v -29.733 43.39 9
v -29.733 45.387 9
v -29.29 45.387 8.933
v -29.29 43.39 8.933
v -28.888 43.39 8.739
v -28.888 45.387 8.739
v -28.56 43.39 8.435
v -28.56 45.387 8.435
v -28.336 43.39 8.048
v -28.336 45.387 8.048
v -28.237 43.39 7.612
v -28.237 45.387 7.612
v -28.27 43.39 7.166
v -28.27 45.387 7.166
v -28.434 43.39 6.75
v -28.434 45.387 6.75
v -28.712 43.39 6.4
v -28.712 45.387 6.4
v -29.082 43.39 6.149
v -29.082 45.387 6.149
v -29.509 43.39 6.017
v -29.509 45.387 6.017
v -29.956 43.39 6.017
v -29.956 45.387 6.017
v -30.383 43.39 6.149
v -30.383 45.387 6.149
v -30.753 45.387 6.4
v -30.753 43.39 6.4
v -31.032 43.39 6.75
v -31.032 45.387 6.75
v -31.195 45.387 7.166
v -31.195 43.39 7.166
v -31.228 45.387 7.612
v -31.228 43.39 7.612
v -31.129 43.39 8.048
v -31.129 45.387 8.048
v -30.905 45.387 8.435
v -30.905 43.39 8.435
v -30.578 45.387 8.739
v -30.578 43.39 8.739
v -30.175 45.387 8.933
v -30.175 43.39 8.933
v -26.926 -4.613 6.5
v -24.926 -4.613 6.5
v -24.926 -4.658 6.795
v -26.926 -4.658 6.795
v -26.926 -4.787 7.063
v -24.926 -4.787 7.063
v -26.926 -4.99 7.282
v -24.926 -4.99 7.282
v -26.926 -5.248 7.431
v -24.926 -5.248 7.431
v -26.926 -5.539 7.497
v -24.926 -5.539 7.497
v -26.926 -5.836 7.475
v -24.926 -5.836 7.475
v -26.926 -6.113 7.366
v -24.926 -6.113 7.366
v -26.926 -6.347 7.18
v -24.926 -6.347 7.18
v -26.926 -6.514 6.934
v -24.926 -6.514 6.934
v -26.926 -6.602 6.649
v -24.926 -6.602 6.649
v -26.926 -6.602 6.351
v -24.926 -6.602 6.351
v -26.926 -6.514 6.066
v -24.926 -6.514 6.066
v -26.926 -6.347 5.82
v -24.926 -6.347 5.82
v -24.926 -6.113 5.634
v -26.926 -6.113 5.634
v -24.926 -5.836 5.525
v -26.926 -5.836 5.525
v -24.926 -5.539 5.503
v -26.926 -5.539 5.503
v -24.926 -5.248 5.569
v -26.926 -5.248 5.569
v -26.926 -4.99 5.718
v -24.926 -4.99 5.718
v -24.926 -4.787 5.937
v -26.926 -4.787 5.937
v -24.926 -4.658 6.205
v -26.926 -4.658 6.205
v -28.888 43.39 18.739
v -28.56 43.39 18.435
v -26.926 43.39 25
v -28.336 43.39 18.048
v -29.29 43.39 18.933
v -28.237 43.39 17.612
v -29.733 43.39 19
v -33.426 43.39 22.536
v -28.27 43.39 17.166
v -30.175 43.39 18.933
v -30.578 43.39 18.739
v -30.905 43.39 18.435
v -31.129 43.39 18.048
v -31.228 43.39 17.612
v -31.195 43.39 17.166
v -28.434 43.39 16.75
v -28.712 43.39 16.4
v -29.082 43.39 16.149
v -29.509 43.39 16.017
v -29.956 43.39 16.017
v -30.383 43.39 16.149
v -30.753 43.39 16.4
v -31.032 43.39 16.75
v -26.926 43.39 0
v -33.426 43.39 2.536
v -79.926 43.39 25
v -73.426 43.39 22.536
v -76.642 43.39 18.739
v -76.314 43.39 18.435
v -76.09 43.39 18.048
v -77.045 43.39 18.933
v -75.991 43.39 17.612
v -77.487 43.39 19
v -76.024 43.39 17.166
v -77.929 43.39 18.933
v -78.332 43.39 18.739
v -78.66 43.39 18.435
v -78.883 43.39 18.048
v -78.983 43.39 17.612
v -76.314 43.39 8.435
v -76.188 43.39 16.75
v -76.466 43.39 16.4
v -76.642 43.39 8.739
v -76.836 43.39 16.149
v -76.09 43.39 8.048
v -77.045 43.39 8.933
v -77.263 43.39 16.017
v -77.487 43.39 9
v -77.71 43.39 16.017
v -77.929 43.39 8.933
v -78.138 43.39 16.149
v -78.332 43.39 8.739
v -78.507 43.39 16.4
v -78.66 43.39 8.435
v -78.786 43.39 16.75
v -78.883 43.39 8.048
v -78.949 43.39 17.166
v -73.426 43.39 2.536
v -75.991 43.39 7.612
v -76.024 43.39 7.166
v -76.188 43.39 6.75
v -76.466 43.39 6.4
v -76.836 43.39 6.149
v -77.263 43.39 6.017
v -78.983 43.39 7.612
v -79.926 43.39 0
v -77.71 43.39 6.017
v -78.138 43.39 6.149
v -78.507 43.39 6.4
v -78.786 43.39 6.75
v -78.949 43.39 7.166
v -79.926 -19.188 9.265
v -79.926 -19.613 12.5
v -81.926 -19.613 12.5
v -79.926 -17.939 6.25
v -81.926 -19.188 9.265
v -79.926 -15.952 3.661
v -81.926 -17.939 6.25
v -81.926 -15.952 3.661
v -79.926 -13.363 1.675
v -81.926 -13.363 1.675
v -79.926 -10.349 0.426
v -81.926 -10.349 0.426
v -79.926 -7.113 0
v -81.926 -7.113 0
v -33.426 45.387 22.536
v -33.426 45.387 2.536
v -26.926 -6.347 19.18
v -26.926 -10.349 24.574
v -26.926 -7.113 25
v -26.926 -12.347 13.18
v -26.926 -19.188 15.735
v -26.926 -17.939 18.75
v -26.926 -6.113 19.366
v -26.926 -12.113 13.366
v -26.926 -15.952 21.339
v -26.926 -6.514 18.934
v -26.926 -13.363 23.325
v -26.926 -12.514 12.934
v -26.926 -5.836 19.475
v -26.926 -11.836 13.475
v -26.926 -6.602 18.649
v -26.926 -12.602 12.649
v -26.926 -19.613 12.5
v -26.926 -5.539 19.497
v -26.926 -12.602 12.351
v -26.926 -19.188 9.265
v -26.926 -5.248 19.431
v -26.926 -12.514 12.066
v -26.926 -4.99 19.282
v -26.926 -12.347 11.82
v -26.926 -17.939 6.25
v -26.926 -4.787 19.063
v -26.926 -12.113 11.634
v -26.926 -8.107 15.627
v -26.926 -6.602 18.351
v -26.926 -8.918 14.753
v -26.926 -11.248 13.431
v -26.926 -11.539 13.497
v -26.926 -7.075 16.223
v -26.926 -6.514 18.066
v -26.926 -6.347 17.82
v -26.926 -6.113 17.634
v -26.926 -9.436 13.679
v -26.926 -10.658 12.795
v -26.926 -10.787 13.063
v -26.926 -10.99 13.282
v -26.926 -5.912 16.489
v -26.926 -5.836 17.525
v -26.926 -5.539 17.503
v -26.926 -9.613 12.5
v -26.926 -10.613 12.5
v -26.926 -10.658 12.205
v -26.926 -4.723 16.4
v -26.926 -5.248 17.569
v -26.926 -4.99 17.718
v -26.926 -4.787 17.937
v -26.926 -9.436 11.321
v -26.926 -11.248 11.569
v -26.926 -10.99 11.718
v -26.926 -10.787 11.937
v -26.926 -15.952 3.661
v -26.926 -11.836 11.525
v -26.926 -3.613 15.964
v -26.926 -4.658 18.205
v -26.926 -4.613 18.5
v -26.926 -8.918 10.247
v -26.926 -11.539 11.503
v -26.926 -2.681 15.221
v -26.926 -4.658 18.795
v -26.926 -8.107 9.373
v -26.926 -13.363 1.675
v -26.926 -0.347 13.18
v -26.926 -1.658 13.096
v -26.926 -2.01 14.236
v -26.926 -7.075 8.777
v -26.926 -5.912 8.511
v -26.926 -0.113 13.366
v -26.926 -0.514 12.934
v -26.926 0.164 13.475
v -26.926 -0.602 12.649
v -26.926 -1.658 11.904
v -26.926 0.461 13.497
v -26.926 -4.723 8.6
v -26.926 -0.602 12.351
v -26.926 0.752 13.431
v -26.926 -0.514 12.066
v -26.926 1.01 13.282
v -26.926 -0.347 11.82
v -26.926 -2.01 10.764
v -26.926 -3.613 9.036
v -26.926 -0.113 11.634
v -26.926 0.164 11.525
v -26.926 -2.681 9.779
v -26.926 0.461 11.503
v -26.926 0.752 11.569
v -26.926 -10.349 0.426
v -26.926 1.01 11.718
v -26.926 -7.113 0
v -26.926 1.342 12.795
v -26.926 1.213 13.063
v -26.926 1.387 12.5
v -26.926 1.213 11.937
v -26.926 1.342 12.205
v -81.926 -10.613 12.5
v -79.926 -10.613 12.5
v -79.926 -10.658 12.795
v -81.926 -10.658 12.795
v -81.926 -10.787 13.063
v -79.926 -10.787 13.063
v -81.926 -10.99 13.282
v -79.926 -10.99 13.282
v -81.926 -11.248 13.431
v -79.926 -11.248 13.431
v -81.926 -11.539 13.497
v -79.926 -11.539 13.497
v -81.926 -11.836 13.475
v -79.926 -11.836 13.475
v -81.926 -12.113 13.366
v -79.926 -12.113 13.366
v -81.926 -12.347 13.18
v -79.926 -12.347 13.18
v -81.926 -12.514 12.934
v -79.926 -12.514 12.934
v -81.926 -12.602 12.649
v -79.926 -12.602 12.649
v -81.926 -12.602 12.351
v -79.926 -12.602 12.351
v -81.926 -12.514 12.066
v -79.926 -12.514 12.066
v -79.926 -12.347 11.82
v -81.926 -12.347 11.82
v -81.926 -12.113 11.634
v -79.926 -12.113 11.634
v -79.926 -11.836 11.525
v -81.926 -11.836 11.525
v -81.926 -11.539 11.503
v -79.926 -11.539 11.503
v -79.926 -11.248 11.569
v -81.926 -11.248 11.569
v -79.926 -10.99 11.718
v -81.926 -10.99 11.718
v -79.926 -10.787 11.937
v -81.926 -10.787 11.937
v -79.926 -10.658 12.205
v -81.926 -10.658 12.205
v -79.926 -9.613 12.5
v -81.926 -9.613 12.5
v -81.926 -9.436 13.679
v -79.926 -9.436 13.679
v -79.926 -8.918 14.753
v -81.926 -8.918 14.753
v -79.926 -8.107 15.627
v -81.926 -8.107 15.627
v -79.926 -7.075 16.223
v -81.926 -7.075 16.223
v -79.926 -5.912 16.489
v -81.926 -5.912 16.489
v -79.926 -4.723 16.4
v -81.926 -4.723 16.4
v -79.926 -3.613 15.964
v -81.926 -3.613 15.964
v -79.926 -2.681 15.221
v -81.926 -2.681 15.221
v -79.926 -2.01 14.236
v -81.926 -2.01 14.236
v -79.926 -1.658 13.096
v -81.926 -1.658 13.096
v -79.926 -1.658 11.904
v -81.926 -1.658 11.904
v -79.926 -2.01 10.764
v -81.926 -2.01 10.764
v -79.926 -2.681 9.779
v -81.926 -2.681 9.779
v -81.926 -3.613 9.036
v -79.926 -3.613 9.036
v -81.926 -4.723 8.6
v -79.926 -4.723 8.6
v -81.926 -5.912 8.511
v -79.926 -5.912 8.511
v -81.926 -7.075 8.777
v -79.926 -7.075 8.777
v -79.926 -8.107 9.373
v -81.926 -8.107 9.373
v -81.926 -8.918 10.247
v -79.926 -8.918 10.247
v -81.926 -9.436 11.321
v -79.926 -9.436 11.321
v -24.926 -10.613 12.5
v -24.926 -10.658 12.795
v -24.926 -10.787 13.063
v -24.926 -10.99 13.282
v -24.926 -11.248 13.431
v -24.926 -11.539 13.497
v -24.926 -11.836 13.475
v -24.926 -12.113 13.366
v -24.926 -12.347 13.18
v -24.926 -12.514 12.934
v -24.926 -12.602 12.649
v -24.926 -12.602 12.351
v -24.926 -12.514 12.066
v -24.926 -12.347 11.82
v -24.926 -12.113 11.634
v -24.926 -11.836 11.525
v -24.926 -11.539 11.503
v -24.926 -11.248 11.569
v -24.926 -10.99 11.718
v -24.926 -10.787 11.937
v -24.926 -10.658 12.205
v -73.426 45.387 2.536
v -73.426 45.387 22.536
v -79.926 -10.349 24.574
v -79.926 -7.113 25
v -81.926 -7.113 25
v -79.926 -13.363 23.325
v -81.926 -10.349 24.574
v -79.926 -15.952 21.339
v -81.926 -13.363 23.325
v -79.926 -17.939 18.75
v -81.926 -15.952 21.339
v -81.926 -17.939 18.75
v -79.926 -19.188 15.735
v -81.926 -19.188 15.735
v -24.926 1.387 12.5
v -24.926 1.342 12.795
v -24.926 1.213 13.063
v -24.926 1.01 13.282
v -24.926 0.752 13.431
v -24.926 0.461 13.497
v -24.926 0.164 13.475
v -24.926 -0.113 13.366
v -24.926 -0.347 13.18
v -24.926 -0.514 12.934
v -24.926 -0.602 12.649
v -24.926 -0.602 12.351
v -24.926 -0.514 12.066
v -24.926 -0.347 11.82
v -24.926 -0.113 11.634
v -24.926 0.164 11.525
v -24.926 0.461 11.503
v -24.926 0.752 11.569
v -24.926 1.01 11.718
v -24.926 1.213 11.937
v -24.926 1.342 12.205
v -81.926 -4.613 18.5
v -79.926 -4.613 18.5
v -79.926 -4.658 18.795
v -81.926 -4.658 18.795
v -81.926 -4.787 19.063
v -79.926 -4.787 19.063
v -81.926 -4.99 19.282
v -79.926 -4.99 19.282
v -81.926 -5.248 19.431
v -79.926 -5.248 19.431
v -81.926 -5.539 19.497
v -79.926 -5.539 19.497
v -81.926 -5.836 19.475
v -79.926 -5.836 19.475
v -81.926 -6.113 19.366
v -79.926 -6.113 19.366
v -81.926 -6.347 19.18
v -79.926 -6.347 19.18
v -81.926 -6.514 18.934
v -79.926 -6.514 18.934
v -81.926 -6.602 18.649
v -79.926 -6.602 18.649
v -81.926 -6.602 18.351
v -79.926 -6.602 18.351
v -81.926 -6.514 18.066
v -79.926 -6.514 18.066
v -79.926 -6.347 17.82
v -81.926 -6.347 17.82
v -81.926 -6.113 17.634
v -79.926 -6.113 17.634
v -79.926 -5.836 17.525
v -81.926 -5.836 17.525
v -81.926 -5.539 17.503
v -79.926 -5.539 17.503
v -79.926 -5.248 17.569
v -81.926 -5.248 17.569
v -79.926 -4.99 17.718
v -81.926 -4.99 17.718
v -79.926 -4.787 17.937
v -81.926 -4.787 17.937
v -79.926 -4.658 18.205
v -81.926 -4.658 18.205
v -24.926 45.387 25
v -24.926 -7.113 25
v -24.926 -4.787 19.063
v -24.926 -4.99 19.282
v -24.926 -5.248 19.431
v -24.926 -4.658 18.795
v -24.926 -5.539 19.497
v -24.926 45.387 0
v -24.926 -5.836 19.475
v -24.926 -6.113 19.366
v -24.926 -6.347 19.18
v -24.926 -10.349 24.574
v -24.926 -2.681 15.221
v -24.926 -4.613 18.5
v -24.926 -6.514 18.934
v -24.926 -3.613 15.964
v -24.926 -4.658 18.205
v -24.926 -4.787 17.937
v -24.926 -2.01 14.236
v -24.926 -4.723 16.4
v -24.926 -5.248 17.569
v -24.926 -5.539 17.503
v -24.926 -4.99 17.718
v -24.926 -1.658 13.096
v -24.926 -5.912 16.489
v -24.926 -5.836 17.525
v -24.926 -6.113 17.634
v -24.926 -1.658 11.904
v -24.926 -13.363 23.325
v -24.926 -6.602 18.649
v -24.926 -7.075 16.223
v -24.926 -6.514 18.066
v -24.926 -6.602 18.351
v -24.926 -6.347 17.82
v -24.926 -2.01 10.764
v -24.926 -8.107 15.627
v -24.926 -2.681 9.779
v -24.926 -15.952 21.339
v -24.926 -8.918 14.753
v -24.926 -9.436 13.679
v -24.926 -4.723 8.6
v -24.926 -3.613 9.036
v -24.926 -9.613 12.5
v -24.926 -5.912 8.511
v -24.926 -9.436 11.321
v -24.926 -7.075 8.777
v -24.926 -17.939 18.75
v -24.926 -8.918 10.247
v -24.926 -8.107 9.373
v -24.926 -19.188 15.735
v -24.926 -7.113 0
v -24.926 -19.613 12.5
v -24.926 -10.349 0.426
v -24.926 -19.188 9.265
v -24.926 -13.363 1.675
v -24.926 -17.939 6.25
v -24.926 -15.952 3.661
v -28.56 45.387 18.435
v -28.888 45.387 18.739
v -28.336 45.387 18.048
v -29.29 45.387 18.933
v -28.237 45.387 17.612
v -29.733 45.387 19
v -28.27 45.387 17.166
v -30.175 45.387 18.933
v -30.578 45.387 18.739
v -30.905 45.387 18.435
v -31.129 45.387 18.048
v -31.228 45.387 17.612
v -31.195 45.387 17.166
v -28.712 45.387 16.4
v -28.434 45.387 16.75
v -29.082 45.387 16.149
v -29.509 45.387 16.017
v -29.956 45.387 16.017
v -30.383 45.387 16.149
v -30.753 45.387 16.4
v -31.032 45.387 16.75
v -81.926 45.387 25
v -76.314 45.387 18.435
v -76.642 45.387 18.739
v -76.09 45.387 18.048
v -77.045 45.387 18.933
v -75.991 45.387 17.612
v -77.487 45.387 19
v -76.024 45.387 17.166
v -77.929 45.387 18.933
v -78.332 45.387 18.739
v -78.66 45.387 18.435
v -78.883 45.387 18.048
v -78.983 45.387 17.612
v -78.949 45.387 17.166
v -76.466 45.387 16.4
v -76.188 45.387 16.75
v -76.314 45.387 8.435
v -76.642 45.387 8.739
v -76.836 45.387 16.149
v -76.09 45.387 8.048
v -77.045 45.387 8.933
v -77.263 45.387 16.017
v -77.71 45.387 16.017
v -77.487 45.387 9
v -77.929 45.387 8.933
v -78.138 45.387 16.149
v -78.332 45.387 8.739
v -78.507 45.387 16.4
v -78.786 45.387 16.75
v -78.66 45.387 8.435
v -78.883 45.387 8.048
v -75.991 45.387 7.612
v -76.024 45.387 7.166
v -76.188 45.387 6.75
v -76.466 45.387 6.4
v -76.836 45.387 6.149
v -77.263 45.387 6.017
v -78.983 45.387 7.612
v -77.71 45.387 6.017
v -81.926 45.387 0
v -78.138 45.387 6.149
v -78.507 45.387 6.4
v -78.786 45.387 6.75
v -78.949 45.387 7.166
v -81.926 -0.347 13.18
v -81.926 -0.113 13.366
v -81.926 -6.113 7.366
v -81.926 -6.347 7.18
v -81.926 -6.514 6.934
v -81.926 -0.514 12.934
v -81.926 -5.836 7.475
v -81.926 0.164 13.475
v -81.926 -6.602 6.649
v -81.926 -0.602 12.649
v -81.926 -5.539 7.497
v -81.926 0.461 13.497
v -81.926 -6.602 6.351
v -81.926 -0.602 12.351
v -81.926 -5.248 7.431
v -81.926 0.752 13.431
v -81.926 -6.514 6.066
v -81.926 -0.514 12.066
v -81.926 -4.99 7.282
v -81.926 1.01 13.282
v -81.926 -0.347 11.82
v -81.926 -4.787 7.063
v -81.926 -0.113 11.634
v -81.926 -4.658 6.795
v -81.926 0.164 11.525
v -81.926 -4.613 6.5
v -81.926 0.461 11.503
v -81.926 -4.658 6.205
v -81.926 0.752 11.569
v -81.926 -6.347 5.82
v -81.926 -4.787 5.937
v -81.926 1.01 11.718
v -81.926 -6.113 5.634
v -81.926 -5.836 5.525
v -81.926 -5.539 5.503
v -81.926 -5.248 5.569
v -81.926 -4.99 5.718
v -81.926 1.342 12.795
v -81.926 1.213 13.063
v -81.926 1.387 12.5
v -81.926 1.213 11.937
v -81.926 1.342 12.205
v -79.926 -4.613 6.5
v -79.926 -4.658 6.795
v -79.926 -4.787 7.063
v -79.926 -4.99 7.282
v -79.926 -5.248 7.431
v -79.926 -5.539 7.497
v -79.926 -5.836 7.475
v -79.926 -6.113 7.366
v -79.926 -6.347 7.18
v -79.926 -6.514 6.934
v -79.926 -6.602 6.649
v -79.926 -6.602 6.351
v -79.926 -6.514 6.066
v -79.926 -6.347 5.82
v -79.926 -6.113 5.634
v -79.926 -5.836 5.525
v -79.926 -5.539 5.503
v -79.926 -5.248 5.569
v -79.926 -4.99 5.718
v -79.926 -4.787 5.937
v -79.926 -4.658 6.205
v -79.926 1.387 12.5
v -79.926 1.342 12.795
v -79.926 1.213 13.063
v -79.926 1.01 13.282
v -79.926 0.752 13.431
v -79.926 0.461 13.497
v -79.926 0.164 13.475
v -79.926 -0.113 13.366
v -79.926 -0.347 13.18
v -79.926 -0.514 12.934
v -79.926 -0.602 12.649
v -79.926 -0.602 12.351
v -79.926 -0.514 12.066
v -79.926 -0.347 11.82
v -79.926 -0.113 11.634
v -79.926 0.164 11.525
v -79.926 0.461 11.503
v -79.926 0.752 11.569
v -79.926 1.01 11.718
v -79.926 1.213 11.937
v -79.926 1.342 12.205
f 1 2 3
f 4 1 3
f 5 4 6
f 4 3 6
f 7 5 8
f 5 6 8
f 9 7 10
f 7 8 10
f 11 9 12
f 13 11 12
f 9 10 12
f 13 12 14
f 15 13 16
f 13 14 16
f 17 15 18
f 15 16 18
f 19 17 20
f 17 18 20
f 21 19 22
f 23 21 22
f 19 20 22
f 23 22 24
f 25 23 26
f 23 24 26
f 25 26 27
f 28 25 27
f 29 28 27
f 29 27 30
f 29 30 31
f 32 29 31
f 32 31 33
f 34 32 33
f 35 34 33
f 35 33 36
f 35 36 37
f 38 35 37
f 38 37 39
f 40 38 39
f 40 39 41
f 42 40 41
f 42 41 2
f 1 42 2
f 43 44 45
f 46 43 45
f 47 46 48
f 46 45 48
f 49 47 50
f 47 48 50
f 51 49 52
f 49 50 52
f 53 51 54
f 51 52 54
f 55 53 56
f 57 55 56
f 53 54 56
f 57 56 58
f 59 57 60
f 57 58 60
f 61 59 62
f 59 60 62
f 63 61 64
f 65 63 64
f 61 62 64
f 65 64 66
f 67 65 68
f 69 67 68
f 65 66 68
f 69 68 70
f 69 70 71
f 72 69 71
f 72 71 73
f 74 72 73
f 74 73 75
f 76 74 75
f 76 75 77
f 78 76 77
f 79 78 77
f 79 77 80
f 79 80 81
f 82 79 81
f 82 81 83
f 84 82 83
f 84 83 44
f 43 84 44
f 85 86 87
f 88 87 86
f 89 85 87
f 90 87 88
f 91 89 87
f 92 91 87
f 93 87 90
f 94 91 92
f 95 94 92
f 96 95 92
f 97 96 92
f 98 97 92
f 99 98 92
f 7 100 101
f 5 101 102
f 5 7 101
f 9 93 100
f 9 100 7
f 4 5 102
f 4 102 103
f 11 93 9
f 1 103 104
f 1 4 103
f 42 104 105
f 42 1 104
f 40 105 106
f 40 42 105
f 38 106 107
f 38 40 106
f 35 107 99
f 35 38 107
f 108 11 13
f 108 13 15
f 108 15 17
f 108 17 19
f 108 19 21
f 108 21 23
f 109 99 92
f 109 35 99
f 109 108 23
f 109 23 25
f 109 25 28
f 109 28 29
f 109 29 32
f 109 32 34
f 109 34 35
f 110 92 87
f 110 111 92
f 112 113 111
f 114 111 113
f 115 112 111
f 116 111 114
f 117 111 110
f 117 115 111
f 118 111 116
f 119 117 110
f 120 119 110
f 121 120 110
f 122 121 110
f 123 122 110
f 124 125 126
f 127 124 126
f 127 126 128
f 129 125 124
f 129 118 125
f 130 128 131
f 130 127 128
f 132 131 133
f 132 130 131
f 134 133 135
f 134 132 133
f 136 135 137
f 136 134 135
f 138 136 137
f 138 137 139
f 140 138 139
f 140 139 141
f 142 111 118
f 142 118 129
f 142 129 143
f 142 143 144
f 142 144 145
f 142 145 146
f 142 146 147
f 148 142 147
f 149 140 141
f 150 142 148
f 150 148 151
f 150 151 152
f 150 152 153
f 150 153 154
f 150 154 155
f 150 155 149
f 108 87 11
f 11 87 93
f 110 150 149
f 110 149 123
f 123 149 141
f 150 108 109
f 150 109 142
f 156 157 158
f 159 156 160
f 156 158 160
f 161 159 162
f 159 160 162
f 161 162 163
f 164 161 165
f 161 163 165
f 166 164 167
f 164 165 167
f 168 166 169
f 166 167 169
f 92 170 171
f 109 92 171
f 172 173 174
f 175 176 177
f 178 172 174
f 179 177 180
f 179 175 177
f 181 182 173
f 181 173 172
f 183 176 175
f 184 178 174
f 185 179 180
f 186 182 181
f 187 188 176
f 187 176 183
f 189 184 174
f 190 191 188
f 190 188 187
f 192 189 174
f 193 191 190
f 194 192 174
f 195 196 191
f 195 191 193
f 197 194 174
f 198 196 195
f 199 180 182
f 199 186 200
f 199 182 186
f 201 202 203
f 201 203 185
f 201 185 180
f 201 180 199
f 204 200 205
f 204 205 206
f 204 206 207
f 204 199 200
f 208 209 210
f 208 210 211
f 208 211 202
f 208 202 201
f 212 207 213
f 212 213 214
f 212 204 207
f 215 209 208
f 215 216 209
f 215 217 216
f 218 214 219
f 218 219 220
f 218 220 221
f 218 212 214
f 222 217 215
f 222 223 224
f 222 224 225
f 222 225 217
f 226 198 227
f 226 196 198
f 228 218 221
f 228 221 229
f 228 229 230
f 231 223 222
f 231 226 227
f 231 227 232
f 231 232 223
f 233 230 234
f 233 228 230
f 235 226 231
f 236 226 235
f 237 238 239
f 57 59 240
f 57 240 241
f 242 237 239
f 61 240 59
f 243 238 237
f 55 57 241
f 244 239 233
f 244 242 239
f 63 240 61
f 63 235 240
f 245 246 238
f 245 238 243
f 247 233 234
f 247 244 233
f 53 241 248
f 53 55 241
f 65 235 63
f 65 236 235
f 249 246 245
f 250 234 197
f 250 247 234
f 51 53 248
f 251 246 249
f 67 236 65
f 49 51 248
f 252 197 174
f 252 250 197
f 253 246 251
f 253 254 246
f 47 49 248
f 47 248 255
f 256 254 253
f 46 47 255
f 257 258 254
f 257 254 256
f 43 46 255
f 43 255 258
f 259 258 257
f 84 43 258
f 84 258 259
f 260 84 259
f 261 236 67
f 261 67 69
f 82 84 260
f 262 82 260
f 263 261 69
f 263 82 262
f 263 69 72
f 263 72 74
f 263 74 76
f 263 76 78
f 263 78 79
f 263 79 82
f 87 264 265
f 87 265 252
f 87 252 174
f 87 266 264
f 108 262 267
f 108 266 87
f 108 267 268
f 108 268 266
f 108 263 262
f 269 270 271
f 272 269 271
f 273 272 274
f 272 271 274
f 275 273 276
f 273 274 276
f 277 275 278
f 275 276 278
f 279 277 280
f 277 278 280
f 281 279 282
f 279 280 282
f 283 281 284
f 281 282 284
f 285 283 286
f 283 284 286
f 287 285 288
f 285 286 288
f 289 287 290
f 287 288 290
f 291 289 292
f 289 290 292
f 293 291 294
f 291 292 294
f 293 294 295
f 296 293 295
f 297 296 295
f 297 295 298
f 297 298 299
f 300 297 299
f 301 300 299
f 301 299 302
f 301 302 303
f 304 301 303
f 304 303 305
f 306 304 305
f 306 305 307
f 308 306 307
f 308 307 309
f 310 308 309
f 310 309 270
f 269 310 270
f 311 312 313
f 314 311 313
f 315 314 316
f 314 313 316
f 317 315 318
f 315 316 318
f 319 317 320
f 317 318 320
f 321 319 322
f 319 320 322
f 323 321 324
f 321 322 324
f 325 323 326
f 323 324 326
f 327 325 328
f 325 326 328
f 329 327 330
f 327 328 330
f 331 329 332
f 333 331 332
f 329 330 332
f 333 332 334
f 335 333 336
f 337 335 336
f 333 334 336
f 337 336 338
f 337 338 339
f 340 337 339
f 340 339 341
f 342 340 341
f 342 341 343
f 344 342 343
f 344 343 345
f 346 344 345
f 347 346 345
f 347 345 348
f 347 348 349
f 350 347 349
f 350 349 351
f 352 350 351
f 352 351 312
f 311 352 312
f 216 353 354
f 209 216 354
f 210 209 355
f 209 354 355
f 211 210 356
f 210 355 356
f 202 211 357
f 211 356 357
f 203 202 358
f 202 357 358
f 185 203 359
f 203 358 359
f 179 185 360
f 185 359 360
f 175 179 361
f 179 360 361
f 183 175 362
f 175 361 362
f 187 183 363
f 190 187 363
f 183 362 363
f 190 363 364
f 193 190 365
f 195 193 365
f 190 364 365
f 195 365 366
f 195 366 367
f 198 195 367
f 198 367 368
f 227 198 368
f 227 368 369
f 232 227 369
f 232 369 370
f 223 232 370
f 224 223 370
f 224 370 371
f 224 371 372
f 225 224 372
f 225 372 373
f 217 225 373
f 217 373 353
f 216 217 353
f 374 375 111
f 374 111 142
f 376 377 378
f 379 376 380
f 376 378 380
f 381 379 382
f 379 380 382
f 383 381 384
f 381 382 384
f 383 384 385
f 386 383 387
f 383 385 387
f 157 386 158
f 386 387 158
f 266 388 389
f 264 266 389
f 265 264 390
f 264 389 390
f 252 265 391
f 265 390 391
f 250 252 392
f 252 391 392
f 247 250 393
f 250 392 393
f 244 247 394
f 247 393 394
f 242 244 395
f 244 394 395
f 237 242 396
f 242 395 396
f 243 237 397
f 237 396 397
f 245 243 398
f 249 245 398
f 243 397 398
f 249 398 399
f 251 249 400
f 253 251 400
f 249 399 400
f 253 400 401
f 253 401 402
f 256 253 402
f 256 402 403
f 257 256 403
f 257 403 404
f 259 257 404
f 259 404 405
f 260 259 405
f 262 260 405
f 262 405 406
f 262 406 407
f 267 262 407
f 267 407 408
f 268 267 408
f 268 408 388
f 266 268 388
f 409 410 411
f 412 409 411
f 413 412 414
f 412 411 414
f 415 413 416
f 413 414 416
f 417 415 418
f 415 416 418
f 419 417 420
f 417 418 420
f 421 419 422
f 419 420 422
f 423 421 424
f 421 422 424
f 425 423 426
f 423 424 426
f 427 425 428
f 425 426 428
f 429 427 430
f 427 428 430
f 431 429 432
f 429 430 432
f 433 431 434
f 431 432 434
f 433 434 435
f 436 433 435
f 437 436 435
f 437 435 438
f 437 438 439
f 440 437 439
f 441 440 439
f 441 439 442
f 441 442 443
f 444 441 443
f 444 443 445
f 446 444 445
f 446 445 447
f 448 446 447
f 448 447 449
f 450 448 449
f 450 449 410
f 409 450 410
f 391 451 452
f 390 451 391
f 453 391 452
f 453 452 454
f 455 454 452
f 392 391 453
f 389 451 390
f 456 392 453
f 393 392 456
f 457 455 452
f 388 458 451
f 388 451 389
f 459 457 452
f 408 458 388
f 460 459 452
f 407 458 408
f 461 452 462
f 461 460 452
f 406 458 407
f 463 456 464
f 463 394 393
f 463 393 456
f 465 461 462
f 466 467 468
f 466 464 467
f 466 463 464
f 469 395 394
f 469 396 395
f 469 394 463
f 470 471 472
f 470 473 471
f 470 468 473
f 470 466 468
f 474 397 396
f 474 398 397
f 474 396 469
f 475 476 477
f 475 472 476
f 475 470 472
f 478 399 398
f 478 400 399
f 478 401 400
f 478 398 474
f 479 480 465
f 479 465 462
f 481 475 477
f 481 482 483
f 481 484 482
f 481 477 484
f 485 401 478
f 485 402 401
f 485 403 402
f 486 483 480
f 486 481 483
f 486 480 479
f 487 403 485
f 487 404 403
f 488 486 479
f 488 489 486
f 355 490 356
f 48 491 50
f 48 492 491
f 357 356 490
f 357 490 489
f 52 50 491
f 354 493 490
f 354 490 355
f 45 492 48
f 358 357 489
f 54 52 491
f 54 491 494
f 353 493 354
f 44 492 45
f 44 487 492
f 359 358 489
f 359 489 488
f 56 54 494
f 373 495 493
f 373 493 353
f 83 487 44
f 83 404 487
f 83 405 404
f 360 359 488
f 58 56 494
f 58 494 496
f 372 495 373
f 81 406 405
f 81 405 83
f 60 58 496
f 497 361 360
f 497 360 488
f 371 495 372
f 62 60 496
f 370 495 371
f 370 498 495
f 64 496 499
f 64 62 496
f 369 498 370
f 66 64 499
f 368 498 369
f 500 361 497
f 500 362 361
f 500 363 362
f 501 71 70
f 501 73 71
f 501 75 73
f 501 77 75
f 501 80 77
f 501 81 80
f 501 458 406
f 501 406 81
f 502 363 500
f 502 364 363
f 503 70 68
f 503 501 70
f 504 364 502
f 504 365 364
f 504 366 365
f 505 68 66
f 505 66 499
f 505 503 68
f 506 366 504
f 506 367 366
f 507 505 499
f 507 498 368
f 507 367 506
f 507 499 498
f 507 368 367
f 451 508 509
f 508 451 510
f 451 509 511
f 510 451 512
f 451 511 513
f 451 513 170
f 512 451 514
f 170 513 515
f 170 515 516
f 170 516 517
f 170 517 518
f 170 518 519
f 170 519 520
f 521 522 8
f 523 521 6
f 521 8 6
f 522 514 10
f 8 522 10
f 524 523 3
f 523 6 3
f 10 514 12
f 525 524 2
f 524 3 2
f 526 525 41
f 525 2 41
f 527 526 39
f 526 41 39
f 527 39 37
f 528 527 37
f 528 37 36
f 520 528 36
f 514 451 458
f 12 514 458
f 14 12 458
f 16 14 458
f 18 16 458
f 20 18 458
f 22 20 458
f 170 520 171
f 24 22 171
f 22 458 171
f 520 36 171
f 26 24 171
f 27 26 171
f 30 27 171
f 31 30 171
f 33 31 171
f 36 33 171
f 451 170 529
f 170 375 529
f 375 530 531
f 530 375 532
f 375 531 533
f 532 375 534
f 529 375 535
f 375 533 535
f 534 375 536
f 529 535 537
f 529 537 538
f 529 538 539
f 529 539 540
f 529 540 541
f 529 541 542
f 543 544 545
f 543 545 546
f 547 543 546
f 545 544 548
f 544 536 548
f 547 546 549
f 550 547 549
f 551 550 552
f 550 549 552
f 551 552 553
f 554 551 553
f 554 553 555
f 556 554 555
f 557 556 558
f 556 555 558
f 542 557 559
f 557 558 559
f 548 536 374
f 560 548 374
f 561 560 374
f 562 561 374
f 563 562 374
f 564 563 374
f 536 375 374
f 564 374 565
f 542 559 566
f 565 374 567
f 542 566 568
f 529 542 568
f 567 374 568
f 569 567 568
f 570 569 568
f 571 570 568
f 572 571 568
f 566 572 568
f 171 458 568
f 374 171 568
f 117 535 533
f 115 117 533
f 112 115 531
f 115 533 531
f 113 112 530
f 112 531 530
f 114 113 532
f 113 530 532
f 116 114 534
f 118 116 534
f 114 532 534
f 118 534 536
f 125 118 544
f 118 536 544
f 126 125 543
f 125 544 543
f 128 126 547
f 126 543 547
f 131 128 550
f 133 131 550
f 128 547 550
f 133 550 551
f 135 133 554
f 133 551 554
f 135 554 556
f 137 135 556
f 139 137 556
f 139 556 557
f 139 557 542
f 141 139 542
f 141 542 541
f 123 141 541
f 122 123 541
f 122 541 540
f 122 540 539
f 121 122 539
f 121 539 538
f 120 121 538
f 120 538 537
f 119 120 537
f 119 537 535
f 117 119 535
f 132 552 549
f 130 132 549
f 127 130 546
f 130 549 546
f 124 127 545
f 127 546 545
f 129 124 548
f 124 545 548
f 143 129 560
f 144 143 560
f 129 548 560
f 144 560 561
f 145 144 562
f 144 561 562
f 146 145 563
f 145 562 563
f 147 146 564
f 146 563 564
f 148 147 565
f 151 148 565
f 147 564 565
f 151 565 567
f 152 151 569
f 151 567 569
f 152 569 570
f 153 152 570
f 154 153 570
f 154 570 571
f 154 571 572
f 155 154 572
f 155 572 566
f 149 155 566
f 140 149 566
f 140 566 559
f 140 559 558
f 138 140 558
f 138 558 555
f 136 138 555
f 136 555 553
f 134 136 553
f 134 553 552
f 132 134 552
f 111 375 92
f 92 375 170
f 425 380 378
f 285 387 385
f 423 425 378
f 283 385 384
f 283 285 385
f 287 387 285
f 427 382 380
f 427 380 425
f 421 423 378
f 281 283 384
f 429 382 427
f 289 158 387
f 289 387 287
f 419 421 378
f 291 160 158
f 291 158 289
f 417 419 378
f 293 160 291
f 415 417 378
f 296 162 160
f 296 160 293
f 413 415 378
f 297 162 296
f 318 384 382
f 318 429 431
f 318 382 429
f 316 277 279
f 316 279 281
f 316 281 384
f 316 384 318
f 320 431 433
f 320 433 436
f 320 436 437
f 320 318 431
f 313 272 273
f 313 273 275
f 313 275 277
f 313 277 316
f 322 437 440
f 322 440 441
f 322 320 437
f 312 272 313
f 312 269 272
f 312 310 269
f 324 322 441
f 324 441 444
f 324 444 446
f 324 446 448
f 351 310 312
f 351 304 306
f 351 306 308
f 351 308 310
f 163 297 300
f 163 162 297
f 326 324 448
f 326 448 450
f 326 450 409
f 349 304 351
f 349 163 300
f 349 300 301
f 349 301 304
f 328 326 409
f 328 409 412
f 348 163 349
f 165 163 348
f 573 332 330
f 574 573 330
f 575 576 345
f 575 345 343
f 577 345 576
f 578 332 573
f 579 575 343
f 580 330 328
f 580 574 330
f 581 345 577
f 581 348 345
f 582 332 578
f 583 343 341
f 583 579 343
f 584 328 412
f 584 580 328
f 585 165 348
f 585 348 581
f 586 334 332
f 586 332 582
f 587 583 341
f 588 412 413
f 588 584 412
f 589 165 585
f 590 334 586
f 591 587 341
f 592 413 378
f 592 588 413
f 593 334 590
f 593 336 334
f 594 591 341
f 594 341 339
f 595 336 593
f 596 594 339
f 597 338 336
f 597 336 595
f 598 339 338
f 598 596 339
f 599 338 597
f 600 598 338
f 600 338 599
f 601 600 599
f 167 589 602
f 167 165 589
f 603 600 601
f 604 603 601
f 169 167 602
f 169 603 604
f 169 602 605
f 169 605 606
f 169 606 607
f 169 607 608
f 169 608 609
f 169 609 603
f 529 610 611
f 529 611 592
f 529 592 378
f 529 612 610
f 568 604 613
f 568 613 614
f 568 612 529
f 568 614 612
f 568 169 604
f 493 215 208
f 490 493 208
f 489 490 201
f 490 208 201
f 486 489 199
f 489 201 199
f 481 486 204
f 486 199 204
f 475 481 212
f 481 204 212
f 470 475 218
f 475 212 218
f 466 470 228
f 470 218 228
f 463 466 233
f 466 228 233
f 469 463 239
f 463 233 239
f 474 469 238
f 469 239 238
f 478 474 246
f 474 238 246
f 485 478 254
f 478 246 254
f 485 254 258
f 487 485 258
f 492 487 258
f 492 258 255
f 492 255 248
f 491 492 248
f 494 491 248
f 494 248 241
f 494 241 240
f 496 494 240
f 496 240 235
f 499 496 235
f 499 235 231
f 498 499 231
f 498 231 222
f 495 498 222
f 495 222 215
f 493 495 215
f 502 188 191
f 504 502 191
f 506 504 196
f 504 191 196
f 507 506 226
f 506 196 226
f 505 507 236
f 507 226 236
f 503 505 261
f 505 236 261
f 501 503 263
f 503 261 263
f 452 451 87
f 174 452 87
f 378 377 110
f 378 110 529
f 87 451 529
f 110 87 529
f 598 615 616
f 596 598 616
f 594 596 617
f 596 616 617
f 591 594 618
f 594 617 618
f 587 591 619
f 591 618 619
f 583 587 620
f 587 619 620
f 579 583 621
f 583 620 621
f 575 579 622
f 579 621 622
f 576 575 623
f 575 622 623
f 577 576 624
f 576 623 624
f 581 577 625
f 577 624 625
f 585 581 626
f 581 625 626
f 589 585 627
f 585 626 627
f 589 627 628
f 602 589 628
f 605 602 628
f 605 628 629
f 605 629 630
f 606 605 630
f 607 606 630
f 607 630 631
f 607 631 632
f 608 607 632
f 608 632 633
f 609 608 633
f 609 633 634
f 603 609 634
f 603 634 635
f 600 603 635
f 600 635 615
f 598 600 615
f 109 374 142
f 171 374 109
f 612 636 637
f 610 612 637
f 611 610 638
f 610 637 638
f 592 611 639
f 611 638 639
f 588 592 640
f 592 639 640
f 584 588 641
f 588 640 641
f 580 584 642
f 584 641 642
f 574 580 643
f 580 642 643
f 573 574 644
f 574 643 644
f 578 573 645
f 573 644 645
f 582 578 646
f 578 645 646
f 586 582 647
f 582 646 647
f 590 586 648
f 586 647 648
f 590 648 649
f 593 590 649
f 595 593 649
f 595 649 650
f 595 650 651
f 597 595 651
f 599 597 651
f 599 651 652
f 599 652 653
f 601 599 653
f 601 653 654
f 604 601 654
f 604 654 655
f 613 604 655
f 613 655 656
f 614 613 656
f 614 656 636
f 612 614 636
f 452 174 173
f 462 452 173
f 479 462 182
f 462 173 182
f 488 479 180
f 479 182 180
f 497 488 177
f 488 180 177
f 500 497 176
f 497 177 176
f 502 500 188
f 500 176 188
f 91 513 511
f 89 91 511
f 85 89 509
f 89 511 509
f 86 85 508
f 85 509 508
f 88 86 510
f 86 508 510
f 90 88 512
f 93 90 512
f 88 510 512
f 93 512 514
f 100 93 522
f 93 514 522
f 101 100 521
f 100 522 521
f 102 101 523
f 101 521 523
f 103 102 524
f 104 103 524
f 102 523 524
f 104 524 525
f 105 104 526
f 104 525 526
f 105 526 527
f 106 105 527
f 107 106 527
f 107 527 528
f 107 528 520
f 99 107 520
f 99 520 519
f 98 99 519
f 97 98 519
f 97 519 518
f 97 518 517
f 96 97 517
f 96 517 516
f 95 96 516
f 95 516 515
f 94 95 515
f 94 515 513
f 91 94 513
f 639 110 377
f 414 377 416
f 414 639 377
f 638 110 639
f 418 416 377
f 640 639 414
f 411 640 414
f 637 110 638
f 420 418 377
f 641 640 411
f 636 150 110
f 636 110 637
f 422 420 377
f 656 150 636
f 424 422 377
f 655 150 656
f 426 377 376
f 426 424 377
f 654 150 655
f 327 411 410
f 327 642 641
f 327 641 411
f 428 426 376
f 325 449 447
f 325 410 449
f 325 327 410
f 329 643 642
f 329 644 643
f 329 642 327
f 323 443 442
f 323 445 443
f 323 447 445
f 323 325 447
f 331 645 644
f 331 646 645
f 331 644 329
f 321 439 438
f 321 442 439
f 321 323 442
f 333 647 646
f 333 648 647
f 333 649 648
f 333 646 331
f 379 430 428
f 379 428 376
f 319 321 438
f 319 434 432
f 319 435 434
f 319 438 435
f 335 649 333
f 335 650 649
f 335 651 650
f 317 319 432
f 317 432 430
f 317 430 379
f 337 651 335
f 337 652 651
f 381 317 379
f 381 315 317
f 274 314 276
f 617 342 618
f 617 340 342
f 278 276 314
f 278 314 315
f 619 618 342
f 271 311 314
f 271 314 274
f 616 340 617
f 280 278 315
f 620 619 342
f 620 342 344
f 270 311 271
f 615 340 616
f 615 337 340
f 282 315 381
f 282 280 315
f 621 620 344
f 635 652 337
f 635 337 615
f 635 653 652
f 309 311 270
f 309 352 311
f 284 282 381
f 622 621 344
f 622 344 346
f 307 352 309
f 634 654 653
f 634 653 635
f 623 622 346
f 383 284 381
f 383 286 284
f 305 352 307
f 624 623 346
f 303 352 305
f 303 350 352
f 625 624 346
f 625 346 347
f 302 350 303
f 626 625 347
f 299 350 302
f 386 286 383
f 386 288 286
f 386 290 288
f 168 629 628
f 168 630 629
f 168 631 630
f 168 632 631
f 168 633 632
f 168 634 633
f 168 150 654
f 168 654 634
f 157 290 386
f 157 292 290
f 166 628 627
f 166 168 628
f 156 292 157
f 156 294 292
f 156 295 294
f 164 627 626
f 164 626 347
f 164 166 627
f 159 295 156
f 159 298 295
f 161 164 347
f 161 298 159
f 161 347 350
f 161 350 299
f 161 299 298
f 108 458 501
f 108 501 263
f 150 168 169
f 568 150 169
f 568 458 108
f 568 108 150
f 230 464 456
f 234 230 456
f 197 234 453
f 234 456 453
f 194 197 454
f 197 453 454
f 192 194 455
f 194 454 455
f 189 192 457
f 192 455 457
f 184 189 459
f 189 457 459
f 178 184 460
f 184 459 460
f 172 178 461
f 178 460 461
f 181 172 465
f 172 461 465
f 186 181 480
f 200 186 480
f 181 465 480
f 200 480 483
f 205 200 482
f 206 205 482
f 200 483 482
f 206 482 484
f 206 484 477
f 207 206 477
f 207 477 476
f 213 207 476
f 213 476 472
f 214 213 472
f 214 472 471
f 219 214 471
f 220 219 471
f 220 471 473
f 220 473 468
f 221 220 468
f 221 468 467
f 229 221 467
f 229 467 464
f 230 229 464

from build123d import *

# Parameters (mm, degrees)
BOSS_EXTRUDE2_DEPTH = 25
SKETCH4_R           = 4
CUT_EXTRUDE1_DEPTH  = 108.5257706
SKETCH6_R           = 4
CUT_EXTRUDE2_DEPTH  = 78.032036302
CUT_EXTRUDE3_DEPTH  = 78.032036302
SKETCH9_R           = 1
CUT_EXTRUDE4_DEPTH  = 78.032036302
SKETCH10_R          = 1
CUT_EXTRUDE5_DEPTH  = 108.5257706
SKETCH11_R          = 1.5
SKETCH11_W          = 40
SKETCH11_H          = 20
CUT_EXTRUDE6_DEPTH  = 10


with BuildPart() as part:
    # Sketch3 → Boss-Extrude2 (new body)
    with BuildSketch(Plane.XY):
        Polygon((-79.925523148, 45.386502584), (-27.042967192, 45.386502584), (-24.925523148, 45.386502584), (-24.925523148, -19.613497416), (-26.925523148, -19.613497416), (-26.925523148, 43.389953837), (-79.925523148, 43.389953837), (-79.925523148, -19.613497416), (-81.925523148, -19.613497416), (-81.925523148, 45.386502584), align=None)
    extrude(amount=BOSS_EXTRUDE2_DEPTH)

    # Sketch4 → Cut-Extrude1 (cut, through all)
    with BuildSketch(Plane(origin=(0, 45.386502584, 0), x_dir=(1, 0, 0), z_dir=(0, 1, 0))):
        with Locations(Location((-54.925523148, -12.5, 0), (0, 0, 270))):
            Circle(SKETCH4_R)
    extrude(amount=-CUT_EXTRUDE1_DEPTH, mode=Mode.SUBTRACT)

    # Sketch6 → Cut-Extrude2 (cut, through all)
    with BuildSketch(Plane.ZY.offset(81.925523148)):
        with Locations(Location((12.5, -5.613497416, 0), (0, 0, 270))):
            Circle(SKETCH6_R)
    extrude(amount=-CUT_EXTRUDE2_DEPTH, mode=Mode.SUBTRACT)

    # Sketch8 → Cut-Extrude3 (cut, through all)
    with BuildSketch(Plane.ZY.offset(81.925523148)):
        with BuildLine():
            Line((0, -19.613497416), (12.5, -19.613497416))
            ThreePointArc((12.5, -19.613497416), (3.661165213, -15.952332159), (0, -7.113497352))
            Line((0, -7.113497352), (0, -19.613497416))
        make_face()
        with BuildLine():
            Line((12.5, -19.613497416), (25, -19.613497416))
            Line((25, -19.613497416), (25, -7.113497416))
            ThreePointArc((25, -7.113497416), (21.338834765, -15.952332181), (12.5, -19.613497416))
        make_face()
    extrude(amount=-CUT_EXTRUDE3_DEPTH, mode=Mode.SUBTRACT)

    # Sketch9 → Cut-Extrude4 (cut, through all)
    with BuildSketch(Plane(origin=(-24.925523148, 0, 0), x_dir=(0, 0, -1), z_dir=(1, 0, 0))):
        with Locations(Location((-6.5, -5.613497416, 0), (0, 0, 90))):
            Circle(SKETCH9_R)
        with Locations(Location((-12.5, -11.613497416, 0), (0, 0, 90))):
            Circle(SKETCH9_R)
        with Locations(Location((-18.5, -5.613497416, 0), (0, 0, 90))):
            Circle(SKETCH9_R)
        with Locations(Location((-12.5, 0.386502584, 0), (0, 0, 90))):
            Circle(SKETCH9_R)
    extrude(amount=-CUT_EXTRUDE4_DEPTH, mode=Mode.SUBTRACT)

    # Sketch10 → Cut-Extrude5 (cut, through all)
    with BuildSketch(Plane(origin=(0, 45.386502584, 0), x_dir=(1, 0, 0), z_dir=(0, 1, 0))):
        with Locations(Location((-60.925523148, -12.154997531, 0), (0, 0, 270))):
            Circle(SKETCH10_R)
        with Locations(Location((-54.580522888, -6.49999994, 0), (0, 0, 270))):
            Circle(SKETCH10_R)
        with Locations(Location((-48.925525297, -12.845000201, 0), (0, 0, 270))):
            Circle(SKETCH10_R)
        with Locations(Location((-55.270525558, -18.499997791, 0), (0, 0, 270))):
            Circle(SKETCH10_R)
    extrude(amount=-CUT_EXTRUDE5_DEPTH, mode=Mode.SUBTRACT)

    # Sketch11 → Cut-Extrude6 (cut)
    with BuildSketch(Plane(origin=(0, 45.386502584, 0), x_dir=(1, 0, 0), z_dir=(0, 1, 0))):
        with Locations(Location((-77.486757697, -7.5, 0), (0, 0, 270))):
            Circle(SKETCH11_R)
        with Locations(Location((-77.486757697, -17.5, 0), (0, 0, 270))):
            Circle(SKETCH11_R)
        with Locations(Location((-29.732572802, -17.5, 0), (0, 0, 270))):
            Circle(SKETCH11_R)
        with Locations(Location((-29.732572802, -7.5, 0), (0, 0, 270))):
            Circle(SKETCH11_R)
        with Locations((-53.425523148, -12.535744512)):
            Rectangle(SKETCH11_W, SKETCH11_H)
    extrude(amount=-CUT_EXTRUDE6_DEPTH, mode=Mode.SUBTRACT)


solid = part.part
